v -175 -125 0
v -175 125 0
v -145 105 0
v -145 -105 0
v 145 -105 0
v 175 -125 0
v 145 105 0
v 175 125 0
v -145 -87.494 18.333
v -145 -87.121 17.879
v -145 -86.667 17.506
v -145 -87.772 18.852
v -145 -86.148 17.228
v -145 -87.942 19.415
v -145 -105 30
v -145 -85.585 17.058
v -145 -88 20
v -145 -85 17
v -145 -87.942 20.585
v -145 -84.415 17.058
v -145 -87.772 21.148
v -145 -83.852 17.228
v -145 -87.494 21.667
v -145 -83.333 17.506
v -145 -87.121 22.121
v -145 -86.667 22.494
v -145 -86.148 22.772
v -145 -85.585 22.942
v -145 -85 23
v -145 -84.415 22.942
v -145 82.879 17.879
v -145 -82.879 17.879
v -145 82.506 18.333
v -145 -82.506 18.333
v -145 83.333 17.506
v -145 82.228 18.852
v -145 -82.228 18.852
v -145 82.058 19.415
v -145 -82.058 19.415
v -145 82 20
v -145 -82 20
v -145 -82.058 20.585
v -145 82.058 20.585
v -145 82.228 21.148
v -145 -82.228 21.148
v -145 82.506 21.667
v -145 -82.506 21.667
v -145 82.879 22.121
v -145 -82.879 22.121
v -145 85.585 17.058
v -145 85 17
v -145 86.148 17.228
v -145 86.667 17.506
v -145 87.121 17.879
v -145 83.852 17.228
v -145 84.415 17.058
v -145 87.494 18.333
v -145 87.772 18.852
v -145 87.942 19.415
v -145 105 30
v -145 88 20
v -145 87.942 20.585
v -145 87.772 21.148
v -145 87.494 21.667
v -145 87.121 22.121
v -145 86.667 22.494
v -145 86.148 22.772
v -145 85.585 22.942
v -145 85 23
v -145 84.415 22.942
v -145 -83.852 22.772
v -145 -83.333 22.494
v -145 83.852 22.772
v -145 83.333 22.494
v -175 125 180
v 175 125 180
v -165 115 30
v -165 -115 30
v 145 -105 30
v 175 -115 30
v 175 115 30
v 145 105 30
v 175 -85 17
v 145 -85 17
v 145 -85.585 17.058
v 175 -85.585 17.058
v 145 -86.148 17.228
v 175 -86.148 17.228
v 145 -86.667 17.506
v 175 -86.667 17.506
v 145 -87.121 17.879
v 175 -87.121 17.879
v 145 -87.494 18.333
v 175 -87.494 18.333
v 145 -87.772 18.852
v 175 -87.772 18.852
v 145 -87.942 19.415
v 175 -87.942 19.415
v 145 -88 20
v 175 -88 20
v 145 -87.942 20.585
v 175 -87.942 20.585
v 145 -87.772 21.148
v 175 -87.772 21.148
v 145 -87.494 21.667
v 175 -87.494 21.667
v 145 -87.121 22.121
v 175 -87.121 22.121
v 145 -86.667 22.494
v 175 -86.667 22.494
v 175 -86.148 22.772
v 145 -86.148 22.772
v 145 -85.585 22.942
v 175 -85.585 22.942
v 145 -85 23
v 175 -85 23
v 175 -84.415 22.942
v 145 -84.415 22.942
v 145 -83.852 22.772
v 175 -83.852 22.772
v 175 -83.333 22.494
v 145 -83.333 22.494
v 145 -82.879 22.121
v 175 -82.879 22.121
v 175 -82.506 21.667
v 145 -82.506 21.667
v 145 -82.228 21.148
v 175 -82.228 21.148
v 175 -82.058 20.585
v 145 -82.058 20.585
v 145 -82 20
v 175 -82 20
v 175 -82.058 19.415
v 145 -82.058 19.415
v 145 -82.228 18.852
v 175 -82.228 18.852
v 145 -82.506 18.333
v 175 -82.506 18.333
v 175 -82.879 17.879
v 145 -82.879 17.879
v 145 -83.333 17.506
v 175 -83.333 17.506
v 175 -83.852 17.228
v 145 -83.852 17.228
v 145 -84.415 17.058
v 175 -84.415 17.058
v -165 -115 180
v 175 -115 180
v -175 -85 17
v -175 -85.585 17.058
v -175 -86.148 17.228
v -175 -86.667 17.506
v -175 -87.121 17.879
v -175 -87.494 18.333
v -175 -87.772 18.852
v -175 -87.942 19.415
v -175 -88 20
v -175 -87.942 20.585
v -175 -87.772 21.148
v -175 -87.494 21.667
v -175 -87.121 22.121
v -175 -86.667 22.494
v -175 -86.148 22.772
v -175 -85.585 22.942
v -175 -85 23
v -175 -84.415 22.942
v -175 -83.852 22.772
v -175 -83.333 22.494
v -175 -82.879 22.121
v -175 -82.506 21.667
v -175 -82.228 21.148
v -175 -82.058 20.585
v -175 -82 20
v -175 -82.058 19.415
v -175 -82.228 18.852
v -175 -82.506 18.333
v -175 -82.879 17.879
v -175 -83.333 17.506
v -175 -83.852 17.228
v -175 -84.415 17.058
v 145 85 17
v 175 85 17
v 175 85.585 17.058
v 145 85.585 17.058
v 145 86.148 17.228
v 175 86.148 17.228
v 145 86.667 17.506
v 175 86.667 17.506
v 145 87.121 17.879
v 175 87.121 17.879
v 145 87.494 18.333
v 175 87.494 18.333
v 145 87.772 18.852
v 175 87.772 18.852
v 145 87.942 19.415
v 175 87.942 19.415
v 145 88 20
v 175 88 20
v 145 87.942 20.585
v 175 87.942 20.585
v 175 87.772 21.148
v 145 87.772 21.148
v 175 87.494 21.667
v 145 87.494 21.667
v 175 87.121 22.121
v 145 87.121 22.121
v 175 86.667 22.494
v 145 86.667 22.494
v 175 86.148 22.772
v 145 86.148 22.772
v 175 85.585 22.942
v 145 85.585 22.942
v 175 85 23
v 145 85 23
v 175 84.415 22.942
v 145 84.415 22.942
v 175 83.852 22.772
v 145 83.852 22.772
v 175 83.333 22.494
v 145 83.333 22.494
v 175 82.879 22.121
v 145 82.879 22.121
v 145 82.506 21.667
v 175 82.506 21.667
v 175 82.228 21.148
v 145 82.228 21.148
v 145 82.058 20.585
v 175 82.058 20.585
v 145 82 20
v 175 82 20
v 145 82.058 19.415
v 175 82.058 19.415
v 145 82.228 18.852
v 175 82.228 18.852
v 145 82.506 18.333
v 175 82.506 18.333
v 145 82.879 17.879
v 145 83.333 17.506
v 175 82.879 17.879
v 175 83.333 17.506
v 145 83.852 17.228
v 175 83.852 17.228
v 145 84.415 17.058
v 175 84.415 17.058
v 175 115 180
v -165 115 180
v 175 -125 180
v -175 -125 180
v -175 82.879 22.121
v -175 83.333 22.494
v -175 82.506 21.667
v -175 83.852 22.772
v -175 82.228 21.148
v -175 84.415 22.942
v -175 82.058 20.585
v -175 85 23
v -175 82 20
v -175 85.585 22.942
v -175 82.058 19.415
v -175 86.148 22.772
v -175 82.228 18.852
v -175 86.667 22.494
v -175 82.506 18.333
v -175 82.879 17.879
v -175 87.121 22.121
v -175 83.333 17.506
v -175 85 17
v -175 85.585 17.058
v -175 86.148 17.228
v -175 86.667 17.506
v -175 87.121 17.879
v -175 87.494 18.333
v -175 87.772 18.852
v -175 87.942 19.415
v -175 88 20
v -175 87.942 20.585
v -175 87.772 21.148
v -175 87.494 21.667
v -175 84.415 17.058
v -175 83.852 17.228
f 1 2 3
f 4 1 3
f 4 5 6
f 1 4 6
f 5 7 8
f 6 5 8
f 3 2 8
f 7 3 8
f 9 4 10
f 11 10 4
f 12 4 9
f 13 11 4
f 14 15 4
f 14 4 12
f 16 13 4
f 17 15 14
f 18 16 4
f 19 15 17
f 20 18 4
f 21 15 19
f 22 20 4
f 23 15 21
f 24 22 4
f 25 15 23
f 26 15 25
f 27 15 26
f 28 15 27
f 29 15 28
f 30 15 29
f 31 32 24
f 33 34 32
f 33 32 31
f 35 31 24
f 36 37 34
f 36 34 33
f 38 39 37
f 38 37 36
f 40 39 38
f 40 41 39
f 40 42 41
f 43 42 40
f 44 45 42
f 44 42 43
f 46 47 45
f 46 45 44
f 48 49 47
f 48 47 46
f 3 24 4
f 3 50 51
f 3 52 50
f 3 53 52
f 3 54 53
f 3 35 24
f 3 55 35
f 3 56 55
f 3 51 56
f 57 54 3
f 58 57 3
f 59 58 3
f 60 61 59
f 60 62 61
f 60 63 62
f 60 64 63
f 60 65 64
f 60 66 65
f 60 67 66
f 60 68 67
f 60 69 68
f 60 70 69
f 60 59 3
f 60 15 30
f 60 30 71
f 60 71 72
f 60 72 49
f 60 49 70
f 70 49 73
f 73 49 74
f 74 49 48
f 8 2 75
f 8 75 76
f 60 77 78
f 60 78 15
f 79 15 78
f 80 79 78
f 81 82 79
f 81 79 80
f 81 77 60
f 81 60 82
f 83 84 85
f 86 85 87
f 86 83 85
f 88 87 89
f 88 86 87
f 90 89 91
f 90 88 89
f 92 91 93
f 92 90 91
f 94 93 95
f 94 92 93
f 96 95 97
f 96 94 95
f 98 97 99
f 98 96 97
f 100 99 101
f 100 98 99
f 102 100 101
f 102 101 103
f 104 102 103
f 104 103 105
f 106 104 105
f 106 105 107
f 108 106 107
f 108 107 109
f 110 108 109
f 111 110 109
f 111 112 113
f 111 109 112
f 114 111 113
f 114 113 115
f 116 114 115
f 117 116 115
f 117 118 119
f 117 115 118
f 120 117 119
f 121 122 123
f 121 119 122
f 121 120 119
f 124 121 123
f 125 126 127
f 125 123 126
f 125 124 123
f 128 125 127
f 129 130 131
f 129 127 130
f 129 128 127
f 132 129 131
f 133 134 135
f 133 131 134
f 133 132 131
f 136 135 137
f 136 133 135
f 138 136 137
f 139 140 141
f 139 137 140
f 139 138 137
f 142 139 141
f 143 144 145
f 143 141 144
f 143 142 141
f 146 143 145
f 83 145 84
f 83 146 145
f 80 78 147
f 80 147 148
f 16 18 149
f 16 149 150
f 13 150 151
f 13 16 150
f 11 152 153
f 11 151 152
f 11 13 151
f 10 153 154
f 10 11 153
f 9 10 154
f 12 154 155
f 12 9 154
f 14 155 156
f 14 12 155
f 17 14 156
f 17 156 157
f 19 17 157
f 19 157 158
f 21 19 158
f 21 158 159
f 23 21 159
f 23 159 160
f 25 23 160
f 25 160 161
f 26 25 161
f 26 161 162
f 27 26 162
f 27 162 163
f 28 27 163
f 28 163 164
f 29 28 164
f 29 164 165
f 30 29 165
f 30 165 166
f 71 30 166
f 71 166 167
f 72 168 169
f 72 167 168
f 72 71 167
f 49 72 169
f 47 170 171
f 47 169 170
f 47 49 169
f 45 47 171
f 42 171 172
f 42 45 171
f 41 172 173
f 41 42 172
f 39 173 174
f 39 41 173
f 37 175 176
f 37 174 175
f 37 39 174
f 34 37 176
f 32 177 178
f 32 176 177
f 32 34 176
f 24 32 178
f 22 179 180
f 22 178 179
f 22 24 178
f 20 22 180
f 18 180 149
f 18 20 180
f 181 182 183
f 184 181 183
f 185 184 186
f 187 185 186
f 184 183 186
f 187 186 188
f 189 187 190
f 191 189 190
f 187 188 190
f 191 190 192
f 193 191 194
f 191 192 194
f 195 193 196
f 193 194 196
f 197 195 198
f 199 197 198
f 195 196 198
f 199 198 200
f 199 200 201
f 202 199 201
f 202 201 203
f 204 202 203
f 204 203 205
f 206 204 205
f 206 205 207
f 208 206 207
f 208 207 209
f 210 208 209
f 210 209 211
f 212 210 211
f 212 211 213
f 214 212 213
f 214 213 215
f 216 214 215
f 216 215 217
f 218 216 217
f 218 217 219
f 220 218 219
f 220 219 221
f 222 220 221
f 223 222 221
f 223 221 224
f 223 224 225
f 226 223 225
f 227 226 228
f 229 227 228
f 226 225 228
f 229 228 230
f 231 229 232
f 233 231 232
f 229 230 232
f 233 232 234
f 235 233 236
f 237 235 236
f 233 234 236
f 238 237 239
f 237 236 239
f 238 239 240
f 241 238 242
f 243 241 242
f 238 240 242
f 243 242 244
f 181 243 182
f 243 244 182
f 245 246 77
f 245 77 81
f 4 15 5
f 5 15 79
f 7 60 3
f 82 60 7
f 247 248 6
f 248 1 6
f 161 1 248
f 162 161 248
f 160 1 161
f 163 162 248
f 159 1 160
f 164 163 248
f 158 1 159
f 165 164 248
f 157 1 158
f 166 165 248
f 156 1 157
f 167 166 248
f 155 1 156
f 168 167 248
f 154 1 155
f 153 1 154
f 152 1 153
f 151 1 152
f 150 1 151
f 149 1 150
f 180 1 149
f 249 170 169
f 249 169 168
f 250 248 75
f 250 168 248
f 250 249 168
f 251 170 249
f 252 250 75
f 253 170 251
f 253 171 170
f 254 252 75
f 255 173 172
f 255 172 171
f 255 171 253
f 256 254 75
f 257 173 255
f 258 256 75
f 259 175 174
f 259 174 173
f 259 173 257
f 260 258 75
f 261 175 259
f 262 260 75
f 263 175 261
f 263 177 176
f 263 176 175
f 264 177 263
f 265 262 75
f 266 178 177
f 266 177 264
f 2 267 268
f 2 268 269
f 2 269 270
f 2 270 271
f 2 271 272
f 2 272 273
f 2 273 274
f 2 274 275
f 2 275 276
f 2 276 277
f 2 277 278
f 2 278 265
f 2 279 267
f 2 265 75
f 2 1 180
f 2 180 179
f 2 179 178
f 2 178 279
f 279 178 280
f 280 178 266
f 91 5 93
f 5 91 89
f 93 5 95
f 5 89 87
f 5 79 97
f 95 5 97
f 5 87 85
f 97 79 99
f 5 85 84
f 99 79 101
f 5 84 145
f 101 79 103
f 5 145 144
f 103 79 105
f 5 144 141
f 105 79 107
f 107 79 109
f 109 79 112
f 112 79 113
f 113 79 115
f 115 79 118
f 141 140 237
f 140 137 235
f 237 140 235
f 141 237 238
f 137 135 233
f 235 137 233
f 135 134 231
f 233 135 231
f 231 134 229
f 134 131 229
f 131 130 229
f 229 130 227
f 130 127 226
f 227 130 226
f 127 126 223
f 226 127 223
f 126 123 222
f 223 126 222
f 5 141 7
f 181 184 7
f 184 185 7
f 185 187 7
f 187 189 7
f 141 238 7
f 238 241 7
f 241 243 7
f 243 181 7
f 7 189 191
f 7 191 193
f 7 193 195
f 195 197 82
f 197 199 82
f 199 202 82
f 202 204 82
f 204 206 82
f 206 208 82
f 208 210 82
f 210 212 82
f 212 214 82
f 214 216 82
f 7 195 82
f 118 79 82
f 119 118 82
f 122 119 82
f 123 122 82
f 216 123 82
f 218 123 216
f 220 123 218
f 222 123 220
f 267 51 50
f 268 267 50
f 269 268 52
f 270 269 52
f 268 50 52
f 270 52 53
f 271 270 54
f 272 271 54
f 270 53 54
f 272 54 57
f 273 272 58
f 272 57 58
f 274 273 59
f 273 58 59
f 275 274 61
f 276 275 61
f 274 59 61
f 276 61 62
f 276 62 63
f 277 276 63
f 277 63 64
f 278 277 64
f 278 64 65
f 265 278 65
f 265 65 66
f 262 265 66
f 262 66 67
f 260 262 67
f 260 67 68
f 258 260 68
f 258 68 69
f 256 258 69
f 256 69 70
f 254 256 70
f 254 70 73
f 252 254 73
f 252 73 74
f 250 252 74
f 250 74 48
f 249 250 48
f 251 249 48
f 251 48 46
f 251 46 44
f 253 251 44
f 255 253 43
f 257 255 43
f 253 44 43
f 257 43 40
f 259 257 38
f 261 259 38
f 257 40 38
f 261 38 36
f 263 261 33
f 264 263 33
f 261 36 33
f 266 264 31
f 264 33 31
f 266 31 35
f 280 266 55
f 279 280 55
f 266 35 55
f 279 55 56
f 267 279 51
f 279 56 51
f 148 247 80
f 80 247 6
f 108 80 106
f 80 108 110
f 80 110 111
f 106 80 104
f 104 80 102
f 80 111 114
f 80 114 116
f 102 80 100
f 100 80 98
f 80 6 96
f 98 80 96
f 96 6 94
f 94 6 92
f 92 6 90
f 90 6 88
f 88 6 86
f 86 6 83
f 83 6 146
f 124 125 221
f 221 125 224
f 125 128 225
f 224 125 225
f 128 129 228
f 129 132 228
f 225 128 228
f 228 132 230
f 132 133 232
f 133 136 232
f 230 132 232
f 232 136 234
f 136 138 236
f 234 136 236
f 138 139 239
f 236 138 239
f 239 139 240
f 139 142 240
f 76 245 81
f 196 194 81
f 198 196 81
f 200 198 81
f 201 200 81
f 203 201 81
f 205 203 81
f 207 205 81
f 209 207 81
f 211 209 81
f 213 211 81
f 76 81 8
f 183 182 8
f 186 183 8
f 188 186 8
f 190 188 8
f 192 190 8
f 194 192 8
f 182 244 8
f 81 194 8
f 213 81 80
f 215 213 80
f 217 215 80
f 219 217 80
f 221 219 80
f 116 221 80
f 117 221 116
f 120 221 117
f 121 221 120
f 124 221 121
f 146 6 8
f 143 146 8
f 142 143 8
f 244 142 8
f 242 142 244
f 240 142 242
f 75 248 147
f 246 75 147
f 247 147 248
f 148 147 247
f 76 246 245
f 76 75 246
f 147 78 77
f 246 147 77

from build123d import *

# Parameters (mm, degrees)
SKETCH_1_W          = 350
SKETCH_1_H          = 250
EXTRUDE_1_DEPTH     = 30
SKETCH_2_W          = 290
SKETCH_2_H          = 210
CUT_EXTRUDE_1_DEPTH = 30
SKETCH_3_R          = 3
CUT_EXTRUDE_2_DEPTH = 351
SKETCH_4_W          = 350
SKETCH_4_H          = 250
SKETCH_4_W_2        = 330
SKETCH_4_H_2        = 230
EXTRUDE_2_DEPTH     = 150
SKETCH_5_W          = 10
SKETCH_5_H          = 230
CUT_EXTRUDE_3_DEPTH = 150


with BuildPart() as part:
    # 草图1 → 凸台-拉伸1 (new body)
    with BuildSketch(Plane.XY):
        Rectangle(SKETCH_1_W, SKETCH_1_H)
    extrude(amount=EXTRUDE_1_DEPTH)

    # 草图2 → 切除-拉伸1 (cut)
    with BuildSketch(Plane.XY.offset(30)):
        Rectangle(SKETCH_2_W, SKETCH_2_H)
    extrude(amount=-CUT_EXTRUDE_1_DEPTH, mode=Mode.SUBTRACT)

    # 草图3 → 切除-拉伸2 (cut, through all)
    with BuildSketch(Plane(origin=(175, 0, 0), x_dir=(0, 0, -1), z_dir=(1, 0, 0))):
        with Locations((-20, 85)):
            Circle(SKETCH_3_R)
    cut_extrude_2 = extrude(amount=-CUT_EXTRUDE_2_DEPTH, mode=Mode.SUBTRACT)

    # 镜向1: 切除-拉伸2 across plane
    add(cut_extrude_2.mirror(Plane.ZX), mode=Mode.SUBTRACT)

    # 草图4 → 凸台-拉伸2 (add)
    with BuildSketch(Plane.XY.offset(30)):
        Rectangle(SKETCH_4_W, SKETCH_4_H)
        Rectangle(SKETCH_4_W_2, SKETCH_4_H_2, mode=Mode.SUBTRACT)
    extrude(amount=EXTRUDE_2_DEPTH)

    # 草图5 → 切除-拉伸3 (cut)
    with BuildSketch(Plane.XY.offset(180)):
        with Locations((170, 0)):
            Rectangle(SKETCH_5_W, SKETCH_5_H)
    extrude(amount=-CUT_EXTRUDE_3_DEPTH, mode=Mode.SUBTRACT)


solid = part.part
